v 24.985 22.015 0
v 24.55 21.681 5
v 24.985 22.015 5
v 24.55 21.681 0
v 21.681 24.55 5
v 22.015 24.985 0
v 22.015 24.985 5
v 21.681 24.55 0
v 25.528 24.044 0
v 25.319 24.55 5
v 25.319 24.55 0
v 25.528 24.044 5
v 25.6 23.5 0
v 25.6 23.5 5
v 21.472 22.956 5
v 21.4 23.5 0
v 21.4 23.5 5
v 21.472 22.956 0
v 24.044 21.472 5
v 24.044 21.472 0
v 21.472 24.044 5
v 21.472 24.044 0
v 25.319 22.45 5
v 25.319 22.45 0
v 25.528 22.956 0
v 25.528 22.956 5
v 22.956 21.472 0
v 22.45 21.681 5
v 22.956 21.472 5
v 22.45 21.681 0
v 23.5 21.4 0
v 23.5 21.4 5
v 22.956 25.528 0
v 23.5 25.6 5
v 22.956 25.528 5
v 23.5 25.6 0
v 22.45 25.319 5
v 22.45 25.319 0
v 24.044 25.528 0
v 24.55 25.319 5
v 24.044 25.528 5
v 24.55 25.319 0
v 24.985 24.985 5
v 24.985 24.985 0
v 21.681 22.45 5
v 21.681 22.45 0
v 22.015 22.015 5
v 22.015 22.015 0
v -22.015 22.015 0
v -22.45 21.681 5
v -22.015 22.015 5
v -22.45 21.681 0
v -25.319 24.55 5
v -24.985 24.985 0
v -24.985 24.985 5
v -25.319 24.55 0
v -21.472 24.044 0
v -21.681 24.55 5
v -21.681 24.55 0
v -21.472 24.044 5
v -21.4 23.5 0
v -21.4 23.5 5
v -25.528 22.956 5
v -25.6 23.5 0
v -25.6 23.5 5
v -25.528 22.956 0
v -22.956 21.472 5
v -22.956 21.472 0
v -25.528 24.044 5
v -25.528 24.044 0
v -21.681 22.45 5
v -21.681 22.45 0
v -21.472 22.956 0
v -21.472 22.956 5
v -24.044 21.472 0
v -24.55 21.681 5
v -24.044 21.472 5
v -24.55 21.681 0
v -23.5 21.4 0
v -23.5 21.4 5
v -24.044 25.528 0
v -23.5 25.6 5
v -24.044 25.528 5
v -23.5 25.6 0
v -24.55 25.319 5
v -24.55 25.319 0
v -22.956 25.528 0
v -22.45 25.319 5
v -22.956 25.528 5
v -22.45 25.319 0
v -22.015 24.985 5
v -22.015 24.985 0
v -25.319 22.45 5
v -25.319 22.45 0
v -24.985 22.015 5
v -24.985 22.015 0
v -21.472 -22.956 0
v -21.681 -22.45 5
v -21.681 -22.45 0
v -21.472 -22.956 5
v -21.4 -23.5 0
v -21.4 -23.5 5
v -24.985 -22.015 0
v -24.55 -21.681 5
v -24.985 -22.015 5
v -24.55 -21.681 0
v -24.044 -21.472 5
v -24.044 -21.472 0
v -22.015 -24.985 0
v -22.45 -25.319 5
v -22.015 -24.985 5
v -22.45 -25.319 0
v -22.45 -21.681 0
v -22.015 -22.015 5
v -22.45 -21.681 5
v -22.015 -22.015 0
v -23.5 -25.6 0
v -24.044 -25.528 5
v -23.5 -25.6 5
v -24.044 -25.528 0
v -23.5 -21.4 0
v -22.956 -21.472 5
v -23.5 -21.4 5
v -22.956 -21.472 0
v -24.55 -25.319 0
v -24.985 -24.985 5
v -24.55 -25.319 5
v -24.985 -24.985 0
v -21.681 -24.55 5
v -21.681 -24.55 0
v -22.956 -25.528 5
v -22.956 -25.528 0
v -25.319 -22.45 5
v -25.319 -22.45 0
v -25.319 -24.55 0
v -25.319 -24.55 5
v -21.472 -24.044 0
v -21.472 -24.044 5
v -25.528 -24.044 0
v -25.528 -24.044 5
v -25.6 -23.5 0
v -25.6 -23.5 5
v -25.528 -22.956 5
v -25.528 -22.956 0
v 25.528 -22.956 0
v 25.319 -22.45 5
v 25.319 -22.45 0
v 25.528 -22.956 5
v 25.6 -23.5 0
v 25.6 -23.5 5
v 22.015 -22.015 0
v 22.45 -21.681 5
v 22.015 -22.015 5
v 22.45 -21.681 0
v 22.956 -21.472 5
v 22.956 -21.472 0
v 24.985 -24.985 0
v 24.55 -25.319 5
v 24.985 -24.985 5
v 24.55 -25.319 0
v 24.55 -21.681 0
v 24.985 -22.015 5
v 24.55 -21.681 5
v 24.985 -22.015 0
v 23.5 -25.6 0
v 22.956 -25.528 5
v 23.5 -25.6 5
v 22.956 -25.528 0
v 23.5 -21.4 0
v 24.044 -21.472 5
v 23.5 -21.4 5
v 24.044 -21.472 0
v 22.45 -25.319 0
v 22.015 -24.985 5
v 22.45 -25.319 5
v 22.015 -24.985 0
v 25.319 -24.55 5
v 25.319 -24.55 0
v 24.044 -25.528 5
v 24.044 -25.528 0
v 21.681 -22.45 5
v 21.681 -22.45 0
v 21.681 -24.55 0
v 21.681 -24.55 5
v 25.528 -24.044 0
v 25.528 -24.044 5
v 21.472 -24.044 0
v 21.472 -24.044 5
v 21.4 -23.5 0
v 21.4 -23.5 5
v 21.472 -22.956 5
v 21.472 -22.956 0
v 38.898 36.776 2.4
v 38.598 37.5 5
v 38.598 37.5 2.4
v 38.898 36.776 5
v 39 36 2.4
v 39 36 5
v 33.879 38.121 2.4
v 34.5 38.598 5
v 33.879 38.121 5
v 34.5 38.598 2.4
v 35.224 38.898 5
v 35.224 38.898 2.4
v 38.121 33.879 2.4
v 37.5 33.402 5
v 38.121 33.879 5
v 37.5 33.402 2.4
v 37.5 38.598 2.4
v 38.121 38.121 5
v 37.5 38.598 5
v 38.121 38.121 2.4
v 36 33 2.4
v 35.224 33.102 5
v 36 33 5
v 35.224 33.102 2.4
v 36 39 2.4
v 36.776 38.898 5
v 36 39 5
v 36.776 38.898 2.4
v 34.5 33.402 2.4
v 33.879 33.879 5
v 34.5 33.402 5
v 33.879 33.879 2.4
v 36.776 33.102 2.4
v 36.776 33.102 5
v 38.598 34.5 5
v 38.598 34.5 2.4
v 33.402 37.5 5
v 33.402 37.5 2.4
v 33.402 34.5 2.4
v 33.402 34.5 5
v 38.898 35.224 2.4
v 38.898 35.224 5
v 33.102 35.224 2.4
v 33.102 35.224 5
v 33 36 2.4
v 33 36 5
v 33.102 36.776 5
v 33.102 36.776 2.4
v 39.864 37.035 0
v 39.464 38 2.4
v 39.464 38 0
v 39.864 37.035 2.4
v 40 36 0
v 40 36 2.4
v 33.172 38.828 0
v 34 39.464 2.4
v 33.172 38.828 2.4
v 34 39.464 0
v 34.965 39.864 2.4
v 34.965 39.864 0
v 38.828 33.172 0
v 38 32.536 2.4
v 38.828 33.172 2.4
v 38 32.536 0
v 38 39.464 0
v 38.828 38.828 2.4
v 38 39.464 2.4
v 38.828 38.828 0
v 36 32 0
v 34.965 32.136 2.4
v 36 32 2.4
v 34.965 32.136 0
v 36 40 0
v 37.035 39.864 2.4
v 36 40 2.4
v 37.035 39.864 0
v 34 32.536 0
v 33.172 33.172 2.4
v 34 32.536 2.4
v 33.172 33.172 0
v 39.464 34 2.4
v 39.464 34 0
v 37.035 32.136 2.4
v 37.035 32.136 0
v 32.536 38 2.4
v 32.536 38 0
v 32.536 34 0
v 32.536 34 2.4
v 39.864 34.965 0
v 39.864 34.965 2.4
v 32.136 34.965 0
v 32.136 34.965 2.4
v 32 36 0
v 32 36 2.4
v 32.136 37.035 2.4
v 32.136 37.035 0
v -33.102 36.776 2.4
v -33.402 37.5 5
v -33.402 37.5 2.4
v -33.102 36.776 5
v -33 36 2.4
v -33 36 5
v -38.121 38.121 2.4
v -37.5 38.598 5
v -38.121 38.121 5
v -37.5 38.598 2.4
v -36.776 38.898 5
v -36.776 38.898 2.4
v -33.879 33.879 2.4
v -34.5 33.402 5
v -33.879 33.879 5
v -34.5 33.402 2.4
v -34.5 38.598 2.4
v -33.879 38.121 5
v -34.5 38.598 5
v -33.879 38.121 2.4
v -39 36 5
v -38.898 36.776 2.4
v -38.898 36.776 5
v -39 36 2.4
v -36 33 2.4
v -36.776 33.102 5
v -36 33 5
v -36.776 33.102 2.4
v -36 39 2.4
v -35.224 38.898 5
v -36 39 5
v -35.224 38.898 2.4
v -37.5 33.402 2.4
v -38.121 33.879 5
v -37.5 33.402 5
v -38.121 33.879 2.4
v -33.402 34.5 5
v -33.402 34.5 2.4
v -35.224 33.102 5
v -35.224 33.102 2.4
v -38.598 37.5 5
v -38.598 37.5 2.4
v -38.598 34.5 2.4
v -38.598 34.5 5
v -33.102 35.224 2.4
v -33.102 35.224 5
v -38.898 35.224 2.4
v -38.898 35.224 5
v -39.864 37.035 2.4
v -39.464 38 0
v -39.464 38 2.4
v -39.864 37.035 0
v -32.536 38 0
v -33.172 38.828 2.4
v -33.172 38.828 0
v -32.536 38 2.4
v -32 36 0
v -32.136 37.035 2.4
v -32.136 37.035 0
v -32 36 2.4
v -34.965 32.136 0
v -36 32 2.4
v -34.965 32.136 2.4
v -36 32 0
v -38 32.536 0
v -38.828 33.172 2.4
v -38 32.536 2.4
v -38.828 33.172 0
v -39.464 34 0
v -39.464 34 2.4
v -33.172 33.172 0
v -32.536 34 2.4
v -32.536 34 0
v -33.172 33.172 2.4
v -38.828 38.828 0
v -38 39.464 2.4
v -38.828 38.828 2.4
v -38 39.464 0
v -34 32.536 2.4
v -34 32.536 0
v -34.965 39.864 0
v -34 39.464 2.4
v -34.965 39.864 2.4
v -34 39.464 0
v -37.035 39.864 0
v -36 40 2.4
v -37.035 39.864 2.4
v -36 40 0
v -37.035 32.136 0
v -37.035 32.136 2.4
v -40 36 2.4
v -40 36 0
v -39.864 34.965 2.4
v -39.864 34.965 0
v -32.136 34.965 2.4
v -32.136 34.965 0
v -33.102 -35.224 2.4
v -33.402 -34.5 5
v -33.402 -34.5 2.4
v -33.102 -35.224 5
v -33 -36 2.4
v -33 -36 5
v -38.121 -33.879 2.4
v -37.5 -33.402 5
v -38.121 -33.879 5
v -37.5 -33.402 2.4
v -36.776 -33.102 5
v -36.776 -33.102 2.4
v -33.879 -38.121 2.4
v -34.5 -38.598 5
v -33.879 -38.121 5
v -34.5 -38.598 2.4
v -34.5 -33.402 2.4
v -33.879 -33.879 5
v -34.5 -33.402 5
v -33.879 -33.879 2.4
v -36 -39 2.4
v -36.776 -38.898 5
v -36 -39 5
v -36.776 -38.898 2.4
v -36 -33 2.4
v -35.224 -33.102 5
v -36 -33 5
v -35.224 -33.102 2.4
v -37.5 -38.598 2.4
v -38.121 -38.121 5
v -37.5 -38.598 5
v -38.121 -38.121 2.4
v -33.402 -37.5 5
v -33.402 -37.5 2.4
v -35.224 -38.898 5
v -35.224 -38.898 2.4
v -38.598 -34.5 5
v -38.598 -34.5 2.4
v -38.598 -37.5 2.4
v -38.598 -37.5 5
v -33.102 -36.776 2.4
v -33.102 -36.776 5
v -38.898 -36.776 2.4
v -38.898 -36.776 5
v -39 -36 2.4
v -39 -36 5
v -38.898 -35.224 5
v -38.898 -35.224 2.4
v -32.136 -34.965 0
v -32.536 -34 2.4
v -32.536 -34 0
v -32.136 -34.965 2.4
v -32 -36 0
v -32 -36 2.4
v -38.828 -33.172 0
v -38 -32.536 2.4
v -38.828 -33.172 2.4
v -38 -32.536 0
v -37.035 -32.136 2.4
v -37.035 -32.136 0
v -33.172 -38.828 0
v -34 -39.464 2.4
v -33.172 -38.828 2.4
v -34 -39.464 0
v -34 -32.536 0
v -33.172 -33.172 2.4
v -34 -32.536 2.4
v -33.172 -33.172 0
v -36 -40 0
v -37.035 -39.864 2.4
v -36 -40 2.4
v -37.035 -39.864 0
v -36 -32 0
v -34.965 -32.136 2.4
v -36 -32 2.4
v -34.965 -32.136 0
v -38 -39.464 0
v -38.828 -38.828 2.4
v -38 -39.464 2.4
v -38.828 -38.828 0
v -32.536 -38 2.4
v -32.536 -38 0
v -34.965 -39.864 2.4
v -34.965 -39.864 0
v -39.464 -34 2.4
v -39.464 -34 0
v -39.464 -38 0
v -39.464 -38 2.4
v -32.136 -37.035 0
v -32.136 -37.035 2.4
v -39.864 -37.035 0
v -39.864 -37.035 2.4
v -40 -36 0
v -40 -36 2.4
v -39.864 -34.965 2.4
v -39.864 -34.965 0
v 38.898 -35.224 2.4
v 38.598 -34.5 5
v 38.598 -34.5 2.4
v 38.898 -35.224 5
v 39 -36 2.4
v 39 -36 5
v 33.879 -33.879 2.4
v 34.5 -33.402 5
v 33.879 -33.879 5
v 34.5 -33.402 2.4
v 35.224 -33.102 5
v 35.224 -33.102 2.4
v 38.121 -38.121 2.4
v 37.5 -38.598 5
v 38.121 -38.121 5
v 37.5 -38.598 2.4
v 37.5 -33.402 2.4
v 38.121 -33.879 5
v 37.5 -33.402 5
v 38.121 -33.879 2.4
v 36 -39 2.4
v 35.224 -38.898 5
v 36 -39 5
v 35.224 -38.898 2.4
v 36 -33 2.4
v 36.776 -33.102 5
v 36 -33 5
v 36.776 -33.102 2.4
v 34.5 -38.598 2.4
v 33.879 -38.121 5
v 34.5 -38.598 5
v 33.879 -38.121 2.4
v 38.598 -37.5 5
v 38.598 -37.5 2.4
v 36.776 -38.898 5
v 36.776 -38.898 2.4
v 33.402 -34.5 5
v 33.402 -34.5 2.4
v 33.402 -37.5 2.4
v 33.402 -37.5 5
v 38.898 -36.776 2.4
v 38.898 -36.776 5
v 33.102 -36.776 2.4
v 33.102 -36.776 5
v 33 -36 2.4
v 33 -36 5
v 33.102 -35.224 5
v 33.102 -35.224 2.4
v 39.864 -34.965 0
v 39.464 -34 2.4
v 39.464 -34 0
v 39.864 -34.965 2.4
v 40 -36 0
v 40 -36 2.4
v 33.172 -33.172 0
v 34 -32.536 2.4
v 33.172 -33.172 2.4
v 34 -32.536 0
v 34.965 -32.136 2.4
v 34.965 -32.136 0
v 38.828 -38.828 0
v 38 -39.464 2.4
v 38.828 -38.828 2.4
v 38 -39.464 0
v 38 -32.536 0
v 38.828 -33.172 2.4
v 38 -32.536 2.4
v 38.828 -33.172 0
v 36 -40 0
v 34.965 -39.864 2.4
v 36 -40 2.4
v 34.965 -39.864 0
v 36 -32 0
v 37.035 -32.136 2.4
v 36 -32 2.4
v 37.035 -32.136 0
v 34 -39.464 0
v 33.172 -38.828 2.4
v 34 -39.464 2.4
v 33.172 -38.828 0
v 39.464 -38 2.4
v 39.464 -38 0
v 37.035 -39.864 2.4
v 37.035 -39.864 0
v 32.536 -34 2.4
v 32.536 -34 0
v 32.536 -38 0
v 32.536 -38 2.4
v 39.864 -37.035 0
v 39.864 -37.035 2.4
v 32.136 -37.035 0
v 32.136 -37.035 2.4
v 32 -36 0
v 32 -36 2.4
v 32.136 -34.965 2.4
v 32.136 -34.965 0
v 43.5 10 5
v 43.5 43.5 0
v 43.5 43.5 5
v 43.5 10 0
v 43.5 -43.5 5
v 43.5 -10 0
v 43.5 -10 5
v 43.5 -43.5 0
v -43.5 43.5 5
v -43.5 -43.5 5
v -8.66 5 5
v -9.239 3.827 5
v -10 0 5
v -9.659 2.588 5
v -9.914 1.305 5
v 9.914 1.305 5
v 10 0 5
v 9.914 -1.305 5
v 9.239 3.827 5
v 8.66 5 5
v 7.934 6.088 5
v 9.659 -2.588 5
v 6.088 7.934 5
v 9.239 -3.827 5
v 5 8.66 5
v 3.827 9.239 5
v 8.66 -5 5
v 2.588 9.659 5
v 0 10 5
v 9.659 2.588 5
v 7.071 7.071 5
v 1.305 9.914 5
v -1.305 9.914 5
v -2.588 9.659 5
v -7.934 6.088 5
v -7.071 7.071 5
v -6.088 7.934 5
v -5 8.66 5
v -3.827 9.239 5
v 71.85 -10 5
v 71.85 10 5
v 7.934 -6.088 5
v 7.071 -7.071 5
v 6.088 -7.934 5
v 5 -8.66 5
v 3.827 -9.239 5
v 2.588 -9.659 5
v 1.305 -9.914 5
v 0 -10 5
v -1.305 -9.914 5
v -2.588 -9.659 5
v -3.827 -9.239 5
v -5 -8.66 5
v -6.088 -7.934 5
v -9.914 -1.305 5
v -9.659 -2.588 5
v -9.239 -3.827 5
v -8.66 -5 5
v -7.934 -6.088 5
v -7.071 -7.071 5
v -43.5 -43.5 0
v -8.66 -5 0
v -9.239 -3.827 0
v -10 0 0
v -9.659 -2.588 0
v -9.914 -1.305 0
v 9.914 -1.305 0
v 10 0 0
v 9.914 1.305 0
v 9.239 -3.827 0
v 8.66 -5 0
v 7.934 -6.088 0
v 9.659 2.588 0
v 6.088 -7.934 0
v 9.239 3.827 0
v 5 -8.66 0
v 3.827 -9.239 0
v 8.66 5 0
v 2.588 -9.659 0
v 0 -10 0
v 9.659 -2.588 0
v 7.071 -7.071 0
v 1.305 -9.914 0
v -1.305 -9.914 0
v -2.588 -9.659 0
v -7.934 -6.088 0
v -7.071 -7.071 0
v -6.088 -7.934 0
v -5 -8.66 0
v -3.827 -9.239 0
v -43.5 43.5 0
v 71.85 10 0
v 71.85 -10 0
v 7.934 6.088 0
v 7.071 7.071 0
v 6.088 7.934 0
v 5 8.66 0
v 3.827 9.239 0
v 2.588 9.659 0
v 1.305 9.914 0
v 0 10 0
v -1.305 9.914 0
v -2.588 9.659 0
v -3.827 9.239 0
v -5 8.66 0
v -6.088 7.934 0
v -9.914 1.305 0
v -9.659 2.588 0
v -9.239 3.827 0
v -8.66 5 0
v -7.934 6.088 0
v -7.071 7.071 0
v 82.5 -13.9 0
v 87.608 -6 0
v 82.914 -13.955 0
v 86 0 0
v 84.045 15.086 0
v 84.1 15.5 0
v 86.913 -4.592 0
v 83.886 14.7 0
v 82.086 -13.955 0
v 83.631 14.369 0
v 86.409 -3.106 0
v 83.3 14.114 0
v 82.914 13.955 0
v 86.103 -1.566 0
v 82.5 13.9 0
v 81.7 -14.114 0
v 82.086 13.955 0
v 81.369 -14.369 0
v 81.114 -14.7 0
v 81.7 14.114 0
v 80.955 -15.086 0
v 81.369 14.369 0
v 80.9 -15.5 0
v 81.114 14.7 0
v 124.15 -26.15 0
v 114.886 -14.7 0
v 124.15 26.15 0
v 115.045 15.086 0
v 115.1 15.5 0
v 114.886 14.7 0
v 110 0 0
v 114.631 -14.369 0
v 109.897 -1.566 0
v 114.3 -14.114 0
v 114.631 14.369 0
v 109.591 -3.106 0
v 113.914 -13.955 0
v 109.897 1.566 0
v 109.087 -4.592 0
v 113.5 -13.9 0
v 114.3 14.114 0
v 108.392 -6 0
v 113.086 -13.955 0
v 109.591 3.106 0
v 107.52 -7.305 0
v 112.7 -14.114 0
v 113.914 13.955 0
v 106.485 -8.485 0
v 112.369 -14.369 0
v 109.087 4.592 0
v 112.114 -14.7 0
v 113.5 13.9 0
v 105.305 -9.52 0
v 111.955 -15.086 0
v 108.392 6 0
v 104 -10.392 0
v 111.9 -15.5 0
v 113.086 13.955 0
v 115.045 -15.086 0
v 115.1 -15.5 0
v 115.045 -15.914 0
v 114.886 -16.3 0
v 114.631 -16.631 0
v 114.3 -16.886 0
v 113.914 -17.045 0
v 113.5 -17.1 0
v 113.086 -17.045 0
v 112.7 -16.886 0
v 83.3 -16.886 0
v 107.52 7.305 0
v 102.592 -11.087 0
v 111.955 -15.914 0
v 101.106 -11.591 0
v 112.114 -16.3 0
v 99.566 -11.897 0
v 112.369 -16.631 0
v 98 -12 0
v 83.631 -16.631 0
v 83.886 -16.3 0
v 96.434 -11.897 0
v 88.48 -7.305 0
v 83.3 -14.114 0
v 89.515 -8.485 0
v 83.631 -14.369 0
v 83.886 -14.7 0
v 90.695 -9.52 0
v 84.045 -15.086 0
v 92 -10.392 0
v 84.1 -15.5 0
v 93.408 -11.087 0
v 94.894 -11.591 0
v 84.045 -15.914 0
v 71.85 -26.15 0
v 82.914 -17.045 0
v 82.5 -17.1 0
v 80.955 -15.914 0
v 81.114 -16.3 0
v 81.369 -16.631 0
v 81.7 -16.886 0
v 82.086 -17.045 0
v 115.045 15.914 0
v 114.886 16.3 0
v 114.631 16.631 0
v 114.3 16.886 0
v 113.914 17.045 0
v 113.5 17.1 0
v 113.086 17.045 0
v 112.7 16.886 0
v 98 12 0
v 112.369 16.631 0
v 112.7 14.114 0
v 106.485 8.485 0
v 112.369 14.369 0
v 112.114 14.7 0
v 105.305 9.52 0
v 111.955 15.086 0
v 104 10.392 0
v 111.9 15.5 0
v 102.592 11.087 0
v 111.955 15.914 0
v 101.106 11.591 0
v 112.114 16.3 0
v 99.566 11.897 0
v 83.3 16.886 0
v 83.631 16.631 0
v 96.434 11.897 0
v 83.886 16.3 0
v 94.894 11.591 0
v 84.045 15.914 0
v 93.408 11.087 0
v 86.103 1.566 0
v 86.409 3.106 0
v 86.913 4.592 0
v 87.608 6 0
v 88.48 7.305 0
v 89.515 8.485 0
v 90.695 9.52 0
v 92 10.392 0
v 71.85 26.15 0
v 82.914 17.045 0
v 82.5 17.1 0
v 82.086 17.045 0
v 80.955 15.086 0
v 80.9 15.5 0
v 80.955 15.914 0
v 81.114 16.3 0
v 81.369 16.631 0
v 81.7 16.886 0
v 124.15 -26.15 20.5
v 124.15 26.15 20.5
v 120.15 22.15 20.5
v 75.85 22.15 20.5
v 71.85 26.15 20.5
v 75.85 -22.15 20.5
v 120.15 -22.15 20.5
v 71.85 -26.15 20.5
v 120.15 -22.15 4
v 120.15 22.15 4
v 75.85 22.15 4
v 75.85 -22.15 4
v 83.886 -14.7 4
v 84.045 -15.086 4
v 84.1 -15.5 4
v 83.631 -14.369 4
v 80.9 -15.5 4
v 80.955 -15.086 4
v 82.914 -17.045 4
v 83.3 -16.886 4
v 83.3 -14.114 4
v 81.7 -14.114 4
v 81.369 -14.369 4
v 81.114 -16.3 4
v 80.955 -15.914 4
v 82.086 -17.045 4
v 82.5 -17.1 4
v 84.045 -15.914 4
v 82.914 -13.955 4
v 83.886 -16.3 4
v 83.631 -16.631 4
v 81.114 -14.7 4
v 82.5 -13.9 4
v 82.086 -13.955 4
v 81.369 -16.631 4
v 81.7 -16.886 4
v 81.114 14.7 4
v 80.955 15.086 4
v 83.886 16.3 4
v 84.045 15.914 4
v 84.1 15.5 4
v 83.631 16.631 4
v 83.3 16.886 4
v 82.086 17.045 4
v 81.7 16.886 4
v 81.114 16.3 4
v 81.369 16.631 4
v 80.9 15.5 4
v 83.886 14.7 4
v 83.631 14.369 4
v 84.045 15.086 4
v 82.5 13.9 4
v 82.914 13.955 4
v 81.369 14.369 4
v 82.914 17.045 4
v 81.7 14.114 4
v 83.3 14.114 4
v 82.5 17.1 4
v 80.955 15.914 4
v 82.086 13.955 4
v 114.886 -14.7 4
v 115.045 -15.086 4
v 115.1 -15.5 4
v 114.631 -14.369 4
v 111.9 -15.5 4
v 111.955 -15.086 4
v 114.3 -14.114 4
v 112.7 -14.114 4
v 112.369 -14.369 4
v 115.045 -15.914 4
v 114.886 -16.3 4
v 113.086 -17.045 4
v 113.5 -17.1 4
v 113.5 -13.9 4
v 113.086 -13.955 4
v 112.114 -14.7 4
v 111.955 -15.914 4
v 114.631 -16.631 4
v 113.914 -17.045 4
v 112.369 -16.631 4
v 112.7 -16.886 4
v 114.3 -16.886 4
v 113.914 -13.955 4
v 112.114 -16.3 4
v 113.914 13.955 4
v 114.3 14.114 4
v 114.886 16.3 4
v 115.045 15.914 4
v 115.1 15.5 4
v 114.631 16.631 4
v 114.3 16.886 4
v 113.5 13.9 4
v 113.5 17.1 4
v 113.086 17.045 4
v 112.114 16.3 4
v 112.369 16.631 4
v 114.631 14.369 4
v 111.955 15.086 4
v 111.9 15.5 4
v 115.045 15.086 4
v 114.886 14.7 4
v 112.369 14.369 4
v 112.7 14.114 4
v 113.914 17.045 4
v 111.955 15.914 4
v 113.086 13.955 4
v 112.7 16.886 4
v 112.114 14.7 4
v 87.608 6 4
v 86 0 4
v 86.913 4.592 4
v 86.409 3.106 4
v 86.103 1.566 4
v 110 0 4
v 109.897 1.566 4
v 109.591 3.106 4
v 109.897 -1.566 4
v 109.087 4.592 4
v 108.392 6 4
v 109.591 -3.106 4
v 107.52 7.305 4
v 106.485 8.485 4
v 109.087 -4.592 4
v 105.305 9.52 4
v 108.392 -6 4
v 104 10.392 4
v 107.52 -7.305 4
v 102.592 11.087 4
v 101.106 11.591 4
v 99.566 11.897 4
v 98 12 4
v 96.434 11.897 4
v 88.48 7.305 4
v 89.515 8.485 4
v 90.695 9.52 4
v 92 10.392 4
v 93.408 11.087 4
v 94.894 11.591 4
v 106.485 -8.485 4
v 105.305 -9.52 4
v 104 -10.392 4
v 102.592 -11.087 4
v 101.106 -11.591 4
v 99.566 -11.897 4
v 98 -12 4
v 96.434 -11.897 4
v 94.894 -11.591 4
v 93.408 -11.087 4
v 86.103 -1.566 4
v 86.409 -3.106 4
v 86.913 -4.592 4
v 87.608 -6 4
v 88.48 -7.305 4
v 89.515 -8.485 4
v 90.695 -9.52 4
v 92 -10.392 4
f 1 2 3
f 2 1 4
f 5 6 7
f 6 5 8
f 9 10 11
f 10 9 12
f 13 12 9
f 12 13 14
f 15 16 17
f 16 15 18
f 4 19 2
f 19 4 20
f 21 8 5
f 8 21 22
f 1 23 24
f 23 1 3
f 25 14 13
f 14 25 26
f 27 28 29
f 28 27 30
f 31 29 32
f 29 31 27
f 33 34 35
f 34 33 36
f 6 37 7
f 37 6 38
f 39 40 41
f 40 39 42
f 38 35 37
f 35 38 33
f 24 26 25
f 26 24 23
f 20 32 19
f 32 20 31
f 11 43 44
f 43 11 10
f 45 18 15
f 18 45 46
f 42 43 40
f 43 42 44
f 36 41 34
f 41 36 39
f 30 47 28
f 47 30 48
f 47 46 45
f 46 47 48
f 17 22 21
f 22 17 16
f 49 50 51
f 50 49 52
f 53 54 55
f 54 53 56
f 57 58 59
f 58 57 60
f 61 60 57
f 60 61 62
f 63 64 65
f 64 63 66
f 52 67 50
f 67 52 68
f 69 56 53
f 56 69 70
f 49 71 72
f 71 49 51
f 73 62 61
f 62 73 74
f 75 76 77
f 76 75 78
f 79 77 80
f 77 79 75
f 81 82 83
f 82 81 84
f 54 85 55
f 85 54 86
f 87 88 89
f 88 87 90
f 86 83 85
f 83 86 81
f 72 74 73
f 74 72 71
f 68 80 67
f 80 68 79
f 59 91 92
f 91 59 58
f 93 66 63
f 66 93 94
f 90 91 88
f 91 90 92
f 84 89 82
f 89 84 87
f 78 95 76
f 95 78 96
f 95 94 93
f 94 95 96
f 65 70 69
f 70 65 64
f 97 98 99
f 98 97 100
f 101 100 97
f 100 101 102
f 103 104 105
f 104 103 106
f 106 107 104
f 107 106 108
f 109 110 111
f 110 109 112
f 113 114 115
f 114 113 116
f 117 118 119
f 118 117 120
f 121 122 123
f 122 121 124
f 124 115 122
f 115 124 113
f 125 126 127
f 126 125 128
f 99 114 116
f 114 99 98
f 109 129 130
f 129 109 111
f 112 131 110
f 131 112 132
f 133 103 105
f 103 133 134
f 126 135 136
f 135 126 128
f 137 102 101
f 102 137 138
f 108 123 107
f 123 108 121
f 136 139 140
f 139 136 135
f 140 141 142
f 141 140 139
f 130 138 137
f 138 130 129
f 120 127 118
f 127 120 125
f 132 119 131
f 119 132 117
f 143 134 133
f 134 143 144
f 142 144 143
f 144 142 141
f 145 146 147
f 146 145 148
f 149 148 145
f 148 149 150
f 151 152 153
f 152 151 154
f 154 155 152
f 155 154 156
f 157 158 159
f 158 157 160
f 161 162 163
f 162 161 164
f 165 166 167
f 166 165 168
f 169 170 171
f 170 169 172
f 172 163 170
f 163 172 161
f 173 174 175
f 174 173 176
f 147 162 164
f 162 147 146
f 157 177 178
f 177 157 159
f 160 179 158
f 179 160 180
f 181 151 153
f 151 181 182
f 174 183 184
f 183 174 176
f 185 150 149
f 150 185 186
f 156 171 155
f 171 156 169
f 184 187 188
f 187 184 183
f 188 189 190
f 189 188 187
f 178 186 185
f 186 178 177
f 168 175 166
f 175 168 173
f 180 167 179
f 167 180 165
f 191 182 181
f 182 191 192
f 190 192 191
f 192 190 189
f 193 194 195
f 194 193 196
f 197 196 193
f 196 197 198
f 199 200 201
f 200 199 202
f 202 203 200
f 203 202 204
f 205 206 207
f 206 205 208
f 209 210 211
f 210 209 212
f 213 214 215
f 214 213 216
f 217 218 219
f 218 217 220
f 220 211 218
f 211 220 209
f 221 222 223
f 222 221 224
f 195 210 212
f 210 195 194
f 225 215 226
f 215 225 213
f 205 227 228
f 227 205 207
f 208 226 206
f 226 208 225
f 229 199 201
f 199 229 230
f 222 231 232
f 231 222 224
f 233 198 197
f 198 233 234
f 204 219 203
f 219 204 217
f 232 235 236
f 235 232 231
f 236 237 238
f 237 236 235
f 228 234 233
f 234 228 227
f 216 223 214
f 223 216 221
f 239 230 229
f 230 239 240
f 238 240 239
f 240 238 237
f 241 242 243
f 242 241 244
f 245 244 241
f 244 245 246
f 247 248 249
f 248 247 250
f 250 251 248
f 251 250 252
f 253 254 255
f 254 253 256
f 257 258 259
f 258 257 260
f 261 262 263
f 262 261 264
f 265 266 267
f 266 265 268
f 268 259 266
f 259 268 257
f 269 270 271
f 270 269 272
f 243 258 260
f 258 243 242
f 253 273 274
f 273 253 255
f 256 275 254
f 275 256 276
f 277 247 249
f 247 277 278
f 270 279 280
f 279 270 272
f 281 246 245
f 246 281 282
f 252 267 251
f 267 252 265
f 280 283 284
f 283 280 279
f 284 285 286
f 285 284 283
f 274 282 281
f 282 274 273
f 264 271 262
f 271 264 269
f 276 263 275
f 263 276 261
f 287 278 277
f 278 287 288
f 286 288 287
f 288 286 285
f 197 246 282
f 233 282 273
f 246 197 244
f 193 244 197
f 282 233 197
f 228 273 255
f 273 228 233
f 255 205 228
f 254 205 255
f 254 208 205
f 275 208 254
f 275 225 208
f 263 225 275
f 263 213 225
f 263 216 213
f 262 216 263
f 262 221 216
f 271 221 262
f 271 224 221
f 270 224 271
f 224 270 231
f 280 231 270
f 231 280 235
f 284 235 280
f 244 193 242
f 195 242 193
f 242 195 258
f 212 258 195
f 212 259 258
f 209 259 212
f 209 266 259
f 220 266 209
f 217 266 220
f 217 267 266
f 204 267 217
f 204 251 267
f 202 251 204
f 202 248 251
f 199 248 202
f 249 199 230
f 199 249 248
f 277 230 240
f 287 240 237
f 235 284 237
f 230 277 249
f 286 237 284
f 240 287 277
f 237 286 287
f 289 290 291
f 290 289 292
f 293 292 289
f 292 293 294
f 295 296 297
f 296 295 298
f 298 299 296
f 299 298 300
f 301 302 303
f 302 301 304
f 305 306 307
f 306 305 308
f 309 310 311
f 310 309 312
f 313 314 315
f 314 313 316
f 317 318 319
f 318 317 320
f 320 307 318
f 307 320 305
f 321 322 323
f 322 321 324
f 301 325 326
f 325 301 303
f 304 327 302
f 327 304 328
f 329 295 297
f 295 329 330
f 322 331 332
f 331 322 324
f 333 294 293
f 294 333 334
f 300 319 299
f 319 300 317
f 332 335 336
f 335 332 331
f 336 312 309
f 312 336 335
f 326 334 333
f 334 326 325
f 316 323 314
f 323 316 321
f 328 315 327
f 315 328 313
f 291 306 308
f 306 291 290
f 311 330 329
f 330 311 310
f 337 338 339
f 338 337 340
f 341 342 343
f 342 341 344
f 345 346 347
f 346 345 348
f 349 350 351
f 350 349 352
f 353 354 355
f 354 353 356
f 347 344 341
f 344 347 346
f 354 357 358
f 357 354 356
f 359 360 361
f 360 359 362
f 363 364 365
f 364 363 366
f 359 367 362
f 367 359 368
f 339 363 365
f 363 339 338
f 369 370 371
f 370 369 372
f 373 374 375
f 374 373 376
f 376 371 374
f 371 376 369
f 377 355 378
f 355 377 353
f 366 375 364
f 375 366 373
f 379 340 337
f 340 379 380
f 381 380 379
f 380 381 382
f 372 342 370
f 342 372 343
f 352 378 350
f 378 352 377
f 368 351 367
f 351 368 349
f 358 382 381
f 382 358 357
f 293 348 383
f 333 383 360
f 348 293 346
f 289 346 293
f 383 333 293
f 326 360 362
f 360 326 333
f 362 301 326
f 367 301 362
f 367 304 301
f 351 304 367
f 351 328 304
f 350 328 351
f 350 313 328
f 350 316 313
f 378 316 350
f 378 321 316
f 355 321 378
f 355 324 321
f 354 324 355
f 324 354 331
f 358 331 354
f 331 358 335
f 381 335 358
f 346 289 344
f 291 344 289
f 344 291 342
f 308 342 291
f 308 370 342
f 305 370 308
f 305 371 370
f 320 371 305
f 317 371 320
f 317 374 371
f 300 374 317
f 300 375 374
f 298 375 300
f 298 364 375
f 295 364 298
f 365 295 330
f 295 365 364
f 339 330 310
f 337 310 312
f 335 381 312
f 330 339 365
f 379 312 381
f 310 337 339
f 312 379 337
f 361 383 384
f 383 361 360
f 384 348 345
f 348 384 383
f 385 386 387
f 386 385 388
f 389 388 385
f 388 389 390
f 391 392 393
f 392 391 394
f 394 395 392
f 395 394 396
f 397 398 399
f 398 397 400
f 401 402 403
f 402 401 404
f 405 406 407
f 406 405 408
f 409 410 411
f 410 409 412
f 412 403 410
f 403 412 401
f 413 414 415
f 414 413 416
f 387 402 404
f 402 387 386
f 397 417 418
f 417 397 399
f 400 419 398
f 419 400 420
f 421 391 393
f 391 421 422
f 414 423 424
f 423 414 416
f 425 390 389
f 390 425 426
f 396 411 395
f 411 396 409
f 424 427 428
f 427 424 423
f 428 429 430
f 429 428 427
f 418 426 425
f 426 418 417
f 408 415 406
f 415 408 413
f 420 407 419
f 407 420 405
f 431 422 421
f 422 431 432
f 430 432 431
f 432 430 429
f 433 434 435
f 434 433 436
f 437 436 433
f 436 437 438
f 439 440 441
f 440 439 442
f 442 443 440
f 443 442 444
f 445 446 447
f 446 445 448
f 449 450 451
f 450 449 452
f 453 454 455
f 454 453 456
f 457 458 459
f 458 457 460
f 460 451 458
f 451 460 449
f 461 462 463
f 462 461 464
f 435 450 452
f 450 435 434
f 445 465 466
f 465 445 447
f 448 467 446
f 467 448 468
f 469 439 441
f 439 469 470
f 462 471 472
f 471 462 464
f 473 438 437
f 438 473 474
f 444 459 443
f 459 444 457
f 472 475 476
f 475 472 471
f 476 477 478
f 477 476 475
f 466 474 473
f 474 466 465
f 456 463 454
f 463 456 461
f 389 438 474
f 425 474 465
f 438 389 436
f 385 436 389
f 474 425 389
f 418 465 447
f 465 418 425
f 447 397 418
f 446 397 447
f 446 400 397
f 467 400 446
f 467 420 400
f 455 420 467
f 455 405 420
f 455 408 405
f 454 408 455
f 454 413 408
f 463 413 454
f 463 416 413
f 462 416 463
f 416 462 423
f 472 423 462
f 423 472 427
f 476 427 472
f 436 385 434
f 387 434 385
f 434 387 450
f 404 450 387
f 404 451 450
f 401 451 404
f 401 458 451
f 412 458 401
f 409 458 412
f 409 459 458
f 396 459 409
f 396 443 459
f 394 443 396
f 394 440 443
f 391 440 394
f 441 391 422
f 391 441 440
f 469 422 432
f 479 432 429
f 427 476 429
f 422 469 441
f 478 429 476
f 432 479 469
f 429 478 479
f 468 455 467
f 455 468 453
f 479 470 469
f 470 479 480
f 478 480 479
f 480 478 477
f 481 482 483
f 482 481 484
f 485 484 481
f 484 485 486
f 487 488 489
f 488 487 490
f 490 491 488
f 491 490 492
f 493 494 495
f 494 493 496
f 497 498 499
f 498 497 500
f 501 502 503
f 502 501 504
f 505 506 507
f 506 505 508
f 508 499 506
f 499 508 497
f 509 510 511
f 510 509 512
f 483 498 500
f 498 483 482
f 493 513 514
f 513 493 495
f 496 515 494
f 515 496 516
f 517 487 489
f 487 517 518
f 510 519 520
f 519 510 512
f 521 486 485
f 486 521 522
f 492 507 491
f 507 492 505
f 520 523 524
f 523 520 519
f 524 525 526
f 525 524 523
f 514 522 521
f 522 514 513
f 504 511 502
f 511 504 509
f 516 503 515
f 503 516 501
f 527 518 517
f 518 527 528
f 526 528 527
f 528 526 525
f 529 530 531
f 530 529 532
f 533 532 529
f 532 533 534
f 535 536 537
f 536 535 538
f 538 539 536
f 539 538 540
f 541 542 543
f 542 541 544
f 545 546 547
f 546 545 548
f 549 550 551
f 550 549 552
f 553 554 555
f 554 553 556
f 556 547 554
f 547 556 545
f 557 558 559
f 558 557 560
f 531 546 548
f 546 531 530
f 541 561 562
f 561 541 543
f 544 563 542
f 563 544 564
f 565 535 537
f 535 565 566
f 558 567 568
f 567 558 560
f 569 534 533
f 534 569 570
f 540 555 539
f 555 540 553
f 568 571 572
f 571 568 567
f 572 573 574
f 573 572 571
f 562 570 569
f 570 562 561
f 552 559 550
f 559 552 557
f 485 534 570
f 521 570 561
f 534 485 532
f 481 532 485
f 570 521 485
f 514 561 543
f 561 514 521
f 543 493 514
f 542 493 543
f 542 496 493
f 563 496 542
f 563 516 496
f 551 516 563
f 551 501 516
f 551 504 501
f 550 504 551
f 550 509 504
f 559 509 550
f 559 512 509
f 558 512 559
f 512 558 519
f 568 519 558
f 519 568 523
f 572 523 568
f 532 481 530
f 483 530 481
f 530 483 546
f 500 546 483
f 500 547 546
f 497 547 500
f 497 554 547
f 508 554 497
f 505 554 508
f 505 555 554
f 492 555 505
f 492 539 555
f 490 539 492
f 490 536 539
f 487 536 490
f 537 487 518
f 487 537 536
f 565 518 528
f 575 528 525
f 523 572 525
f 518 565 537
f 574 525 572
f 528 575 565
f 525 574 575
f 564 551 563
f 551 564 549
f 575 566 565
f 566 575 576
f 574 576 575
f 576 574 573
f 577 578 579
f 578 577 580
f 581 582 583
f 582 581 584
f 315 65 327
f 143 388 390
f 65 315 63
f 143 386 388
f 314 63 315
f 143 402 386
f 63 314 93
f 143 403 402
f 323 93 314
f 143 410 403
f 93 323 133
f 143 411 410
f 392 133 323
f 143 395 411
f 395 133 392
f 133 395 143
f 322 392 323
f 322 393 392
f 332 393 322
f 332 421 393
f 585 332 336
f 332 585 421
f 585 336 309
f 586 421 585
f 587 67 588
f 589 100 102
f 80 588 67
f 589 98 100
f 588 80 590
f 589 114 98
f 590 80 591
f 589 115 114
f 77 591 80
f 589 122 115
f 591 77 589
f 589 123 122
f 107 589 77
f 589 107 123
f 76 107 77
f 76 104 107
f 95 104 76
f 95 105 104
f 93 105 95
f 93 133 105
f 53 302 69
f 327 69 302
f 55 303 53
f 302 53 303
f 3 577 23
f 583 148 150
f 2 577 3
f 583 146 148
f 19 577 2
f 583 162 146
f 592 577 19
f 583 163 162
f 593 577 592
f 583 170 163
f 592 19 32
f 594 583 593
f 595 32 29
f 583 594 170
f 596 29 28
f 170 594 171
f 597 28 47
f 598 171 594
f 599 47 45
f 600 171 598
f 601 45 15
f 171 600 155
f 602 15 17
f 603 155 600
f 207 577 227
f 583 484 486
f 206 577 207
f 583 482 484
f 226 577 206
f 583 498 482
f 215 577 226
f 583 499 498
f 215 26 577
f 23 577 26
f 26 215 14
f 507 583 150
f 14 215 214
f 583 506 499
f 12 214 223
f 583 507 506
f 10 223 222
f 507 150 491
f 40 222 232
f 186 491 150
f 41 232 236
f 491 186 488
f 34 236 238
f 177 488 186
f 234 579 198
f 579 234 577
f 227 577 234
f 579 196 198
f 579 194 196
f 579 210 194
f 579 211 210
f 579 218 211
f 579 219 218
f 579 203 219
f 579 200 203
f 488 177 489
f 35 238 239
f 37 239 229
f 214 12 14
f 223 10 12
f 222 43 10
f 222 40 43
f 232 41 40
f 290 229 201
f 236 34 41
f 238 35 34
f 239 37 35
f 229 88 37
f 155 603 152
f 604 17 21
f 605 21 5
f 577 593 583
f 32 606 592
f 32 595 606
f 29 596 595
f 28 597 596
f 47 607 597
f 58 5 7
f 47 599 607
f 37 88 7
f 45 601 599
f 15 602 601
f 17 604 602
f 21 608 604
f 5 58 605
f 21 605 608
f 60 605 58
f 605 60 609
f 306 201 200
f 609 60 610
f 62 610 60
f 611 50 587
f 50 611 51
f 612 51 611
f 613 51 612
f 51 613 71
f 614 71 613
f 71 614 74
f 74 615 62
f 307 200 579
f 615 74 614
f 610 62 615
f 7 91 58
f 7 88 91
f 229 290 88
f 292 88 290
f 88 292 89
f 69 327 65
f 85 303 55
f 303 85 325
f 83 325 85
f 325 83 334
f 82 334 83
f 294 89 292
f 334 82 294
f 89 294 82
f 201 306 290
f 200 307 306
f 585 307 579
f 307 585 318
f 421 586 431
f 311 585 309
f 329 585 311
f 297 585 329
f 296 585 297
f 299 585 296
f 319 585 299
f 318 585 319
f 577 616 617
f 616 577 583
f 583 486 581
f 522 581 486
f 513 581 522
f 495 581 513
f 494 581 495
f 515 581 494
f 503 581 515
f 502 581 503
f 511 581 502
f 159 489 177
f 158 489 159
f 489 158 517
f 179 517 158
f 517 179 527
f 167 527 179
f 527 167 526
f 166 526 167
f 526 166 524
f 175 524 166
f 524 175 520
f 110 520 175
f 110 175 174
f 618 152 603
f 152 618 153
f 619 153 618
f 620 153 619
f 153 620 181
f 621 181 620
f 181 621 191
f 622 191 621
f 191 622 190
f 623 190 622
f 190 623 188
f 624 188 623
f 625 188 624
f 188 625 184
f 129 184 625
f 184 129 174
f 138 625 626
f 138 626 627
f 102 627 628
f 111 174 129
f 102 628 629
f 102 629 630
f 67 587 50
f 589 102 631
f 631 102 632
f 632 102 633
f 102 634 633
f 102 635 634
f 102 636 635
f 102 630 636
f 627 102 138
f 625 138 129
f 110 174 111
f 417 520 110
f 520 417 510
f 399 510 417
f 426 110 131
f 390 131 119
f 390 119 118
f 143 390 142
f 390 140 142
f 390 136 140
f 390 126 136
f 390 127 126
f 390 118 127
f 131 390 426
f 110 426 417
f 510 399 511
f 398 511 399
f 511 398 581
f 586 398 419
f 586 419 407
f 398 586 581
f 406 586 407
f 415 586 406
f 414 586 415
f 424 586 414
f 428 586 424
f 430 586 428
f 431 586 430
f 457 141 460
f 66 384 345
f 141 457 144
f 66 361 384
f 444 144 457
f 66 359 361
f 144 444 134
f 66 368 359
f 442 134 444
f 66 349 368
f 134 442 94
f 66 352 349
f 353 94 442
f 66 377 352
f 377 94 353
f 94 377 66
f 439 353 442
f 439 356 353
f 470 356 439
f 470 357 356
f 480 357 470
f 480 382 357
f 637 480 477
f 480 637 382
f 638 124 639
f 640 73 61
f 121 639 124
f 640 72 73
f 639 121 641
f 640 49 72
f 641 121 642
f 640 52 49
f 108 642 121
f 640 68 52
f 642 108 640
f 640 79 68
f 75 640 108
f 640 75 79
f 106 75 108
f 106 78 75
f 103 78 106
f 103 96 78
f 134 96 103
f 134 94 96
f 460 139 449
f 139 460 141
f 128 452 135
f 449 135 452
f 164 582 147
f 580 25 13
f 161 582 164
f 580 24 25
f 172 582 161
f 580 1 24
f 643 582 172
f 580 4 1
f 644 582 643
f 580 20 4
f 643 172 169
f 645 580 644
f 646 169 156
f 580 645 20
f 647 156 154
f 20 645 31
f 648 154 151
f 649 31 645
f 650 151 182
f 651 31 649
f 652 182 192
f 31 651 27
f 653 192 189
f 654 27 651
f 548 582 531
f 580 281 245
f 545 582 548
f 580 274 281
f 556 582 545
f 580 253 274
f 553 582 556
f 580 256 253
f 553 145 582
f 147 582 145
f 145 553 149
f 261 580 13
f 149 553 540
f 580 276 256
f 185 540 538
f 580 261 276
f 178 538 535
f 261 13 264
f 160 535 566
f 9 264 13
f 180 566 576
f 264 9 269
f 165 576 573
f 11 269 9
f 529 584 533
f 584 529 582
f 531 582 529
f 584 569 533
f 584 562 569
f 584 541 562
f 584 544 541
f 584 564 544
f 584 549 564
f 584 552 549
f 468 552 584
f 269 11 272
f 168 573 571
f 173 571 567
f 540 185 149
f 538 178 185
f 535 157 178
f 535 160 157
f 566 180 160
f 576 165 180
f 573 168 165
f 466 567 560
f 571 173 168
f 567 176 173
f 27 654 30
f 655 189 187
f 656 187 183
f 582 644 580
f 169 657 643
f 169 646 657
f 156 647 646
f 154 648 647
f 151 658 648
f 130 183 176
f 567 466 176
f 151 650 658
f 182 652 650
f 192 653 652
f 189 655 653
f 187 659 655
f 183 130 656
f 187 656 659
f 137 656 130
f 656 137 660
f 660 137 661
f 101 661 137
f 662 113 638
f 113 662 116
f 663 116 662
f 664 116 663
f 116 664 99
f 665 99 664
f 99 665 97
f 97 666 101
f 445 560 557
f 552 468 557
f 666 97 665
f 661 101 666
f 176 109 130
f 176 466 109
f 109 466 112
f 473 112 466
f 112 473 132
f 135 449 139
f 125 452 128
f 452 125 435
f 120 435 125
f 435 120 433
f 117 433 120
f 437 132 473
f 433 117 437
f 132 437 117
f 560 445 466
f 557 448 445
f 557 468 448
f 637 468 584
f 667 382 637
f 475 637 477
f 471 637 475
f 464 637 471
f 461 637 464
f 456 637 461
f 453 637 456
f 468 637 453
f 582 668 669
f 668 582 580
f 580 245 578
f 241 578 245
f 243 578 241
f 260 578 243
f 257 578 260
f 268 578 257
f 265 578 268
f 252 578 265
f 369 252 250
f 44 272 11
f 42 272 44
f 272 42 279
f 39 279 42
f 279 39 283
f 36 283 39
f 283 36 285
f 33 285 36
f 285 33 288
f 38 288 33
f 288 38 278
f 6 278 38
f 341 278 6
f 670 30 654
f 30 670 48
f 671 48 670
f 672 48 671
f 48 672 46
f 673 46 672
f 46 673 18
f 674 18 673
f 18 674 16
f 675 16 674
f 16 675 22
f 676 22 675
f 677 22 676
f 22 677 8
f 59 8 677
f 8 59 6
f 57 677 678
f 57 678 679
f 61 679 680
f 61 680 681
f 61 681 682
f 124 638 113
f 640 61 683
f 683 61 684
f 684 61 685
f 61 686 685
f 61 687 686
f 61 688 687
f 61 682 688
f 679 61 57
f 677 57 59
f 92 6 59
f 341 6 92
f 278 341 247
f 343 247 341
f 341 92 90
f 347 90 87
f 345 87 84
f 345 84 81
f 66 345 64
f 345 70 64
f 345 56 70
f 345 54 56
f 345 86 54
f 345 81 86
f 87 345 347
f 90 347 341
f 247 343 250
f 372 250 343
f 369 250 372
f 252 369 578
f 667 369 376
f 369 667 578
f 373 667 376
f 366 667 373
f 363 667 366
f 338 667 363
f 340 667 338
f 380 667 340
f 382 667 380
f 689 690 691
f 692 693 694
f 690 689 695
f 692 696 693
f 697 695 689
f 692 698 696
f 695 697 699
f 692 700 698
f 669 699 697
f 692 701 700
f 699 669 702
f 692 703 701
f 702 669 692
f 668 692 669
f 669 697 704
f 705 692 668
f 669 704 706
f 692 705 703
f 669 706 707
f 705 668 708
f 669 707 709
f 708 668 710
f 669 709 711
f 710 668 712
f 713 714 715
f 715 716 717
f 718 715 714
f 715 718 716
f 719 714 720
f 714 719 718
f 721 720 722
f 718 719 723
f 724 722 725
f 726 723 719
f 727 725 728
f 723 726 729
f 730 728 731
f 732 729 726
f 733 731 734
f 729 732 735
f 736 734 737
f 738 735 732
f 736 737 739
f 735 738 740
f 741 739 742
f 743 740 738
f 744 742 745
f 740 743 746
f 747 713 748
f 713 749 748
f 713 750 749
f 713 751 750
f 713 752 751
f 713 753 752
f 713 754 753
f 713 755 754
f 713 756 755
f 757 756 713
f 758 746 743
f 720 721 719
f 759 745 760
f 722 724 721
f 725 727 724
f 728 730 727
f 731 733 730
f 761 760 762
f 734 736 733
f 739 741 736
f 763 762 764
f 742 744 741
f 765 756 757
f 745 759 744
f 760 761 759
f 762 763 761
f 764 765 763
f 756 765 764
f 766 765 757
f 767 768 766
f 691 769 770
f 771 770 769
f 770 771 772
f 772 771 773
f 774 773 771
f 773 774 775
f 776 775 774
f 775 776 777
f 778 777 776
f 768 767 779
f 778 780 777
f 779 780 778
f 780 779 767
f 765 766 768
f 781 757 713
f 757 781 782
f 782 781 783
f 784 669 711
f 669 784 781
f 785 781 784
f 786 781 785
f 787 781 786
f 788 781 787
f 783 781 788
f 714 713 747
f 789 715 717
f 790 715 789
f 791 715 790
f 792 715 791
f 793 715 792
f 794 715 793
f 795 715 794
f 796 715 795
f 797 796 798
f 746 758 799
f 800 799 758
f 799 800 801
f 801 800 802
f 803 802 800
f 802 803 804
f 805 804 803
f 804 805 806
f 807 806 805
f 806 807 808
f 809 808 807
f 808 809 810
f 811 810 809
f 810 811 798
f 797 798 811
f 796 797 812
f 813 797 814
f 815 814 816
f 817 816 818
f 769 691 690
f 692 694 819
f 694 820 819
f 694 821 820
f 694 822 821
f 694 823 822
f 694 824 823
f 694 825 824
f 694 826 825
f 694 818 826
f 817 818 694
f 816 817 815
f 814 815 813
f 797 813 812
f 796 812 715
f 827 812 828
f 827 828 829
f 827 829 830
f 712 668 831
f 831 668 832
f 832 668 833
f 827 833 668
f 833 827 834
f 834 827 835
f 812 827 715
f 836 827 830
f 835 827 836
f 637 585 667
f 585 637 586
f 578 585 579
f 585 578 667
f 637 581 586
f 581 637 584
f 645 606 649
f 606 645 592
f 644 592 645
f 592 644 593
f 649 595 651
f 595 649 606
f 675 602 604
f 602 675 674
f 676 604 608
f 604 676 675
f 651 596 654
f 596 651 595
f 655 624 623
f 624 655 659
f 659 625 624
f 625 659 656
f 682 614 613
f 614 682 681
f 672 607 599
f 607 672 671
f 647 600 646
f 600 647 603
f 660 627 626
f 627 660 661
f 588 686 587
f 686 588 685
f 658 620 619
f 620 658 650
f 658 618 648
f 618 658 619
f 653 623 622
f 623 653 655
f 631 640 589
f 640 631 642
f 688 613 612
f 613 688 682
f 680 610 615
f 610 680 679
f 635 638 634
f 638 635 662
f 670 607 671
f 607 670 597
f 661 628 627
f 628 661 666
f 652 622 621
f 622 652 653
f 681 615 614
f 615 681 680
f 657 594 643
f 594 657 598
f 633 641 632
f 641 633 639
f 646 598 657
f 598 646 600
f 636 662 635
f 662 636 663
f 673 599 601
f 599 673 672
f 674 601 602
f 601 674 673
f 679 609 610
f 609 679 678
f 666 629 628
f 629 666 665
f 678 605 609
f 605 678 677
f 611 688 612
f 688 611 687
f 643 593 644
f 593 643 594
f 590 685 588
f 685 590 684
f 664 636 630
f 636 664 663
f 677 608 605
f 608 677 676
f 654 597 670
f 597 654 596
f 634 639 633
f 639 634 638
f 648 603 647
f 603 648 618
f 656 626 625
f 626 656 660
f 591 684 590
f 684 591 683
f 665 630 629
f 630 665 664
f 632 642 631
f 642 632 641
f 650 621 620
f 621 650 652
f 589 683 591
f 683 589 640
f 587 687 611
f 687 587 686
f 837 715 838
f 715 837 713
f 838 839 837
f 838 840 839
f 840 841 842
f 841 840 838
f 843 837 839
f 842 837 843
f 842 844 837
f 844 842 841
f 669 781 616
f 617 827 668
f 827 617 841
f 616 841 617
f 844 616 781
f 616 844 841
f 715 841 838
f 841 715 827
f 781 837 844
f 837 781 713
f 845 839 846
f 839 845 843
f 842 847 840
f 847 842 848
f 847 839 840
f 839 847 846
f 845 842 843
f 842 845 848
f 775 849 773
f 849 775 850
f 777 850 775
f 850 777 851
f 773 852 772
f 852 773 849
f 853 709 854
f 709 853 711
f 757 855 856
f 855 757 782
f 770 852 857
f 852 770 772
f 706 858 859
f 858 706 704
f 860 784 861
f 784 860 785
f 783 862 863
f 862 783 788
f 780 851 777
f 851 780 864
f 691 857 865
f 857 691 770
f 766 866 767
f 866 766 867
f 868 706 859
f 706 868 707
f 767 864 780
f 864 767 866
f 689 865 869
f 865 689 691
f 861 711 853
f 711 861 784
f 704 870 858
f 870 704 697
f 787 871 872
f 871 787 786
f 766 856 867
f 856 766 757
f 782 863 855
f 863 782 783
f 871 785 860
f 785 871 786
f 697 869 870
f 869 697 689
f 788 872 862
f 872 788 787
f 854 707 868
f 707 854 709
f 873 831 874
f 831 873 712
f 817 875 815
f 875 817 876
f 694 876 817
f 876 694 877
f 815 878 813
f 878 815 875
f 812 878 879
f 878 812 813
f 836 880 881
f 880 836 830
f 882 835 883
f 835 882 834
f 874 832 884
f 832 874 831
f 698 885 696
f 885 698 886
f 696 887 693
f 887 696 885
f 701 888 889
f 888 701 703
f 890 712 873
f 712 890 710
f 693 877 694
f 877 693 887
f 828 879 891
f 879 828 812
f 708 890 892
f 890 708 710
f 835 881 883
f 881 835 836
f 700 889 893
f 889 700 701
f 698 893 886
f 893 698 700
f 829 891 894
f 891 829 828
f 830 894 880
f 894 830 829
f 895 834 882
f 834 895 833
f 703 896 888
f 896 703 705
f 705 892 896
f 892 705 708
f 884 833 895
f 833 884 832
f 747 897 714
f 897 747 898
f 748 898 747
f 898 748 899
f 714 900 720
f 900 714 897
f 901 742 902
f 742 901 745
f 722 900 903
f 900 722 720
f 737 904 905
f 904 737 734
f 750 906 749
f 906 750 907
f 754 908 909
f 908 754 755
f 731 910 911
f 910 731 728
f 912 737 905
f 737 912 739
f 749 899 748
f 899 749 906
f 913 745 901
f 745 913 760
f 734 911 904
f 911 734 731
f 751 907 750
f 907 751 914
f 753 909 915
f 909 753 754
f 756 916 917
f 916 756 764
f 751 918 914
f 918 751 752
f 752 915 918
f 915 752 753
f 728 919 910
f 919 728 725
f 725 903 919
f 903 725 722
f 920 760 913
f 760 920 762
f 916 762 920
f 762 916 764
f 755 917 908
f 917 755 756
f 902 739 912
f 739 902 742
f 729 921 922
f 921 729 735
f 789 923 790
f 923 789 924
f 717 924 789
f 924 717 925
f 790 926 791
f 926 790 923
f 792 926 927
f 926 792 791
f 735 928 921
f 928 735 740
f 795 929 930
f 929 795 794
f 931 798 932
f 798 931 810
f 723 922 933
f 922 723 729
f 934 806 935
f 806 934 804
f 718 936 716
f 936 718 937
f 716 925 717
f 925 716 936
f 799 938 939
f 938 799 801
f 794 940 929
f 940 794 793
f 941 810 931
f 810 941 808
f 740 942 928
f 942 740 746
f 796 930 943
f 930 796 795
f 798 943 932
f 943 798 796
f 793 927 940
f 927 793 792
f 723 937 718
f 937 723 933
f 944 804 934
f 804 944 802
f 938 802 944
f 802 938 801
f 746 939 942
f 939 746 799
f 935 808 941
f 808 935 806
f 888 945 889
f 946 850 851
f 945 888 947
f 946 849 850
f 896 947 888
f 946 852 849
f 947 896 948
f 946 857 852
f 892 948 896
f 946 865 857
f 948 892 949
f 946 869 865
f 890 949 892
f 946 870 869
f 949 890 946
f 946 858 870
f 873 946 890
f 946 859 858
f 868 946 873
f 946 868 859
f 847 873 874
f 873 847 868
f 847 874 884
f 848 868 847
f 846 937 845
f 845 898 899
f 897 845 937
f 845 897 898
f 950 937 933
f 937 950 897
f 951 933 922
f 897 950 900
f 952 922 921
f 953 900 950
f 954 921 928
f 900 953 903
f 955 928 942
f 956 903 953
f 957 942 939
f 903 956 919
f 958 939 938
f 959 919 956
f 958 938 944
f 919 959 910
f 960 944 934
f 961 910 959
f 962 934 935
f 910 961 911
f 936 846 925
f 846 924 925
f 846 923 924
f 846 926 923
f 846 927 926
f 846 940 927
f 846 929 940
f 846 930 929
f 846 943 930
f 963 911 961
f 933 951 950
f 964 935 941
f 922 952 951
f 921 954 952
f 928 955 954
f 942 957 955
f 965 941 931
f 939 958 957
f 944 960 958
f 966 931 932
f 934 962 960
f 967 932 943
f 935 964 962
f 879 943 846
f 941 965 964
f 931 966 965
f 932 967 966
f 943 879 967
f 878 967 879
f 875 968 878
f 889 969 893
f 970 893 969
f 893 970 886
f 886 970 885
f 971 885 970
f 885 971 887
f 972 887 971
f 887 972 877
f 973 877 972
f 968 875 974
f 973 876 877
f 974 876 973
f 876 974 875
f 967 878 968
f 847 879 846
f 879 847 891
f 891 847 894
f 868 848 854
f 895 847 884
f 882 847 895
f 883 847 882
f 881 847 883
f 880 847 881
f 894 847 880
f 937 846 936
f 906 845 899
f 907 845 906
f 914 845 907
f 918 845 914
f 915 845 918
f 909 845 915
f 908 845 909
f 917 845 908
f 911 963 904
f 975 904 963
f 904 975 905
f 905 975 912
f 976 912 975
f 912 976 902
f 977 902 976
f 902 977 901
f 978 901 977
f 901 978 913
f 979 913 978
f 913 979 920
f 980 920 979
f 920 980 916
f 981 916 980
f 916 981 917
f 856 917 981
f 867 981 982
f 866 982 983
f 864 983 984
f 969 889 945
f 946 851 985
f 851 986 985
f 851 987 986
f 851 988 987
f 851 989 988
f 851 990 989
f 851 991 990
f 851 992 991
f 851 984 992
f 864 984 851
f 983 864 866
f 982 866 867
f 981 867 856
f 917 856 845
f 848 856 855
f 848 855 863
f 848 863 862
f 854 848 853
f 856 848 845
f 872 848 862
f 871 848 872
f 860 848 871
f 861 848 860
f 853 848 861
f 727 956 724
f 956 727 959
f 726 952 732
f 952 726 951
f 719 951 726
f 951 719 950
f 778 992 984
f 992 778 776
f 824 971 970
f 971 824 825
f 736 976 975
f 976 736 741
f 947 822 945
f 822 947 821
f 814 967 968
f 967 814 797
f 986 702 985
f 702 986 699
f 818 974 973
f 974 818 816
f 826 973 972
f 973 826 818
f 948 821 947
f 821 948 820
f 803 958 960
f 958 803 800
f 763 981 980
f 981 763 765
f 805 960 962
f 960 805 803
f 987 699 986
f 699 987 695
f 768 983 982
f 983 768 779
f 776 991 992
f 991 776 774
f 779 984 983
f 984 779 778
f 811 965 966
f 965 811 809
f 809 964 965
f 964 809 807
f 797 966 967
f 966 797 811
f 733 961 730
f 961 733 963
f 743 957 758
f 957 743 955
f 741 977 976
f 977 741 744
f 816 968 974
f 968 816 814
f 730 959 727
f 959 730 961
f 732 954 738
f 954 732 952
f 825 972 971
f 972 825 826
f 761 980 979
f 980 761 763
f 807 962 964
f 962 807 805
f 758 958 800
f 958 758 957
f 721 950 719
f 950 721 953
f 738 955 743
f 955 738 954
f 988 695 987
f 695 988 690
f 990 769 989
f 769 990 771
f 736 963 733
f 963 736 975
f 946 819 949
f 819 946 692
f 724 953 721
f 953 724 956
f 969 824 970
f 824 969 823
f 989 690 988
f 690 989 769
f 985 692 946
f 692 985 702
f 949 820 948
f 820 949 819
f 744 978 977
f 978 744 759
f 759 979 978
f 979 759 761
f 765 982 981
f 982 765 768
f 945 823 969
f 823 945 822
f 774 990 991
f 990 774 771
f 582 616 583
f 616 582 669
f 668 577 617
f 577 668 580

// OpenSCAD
// file: ../src/model_b_wall_bracket.scad
// ============================================
// PiCanvas - 모델 B: 벽면 브라켓 + 모터 마운트
// ============================================

// --- 파라미터 ---

// 턴테이블 베어링
tb_size = 57;
tb_thickness = 10.5;
tb_bolt_inset = 5;
tb_bolt_dia = 4.2;     // M4 관통홀

// 모터 17HS4023
motor_w = 42.3;
motor_h = 42.3;
motor_d = 23.5;
motor_shaft_dia = 5;
motor_mount_pitch = 31;   // NEMA17 마운트홀 피치
motor_mount_hole = 3.2;   // M3 관통홀
motor_body_dia = 22;      // 모터 전면 보스 직경

// 벨트 시스템
belt_center_distance = 98;  // 축간 거리 (300mm 벨트)

// 모터 위치: 중심에서 belt_center_distance만큼 오프셋
// 모터를 오른쪽(+X)에 배치
motor_offset_x = belt_center_distance;
motor_offset_y = 0;

// 벽면 브라켓
wall_plate_thickness = 5;
wall_plate_margin = 15;    // 턴테이블 주변 여유
wall_anchor_dia = 6;       // 벽 앵커홀 직경
wall_anchor_count_head = 8; // 카운터싱크 직경

// 모터 마운트 (측면 클램프)
motor_clamp_wall = 4;      // 클램프 벽 두께
motor_clamp_gap = 1;       // 모터와의 간극
motor_clamp_height = motor_d - 3;  // 모터 높이보다 살짝 낮게

// Z 높이 맞춤
// 풀리 벨트 면이 모델A의 80T 풀리와 같은 높이여야 함
// 모델A: bracket_thickness(5) + pulley위치
// 모델B에서 모터 샤프트 높이를 맞춤
gt2_belt_width = 6;
bracket_a_thickness = 5;
pulley_ring_offset = bracket_a_thickness + 1;  // 풀리 벨트 중심 Z

// --- 모듈 ---

// 턴테이블 볼트홀 패턴
module tb_bolt_pattern(dia, depth) {
    bolt_x = tb_size/2 - tb_bolt_inset;
    bolt_y = tb_size/2 - tb_bolt_inset;
    positions = [
        [ bolt_x,  bolt_y],
        [-bolt_x,  bolt_y],
        [-bolt_x, -bolt_y],
        [ bolt_x, -bolt_y]
    ];
    for (pos = positions) {
        translate([pos[0], pos[1], -0.1])
            cylinder(d = dia, h = depth + 0.2, $fn = 24);
    }
}

// 벽면 앵커홀
module wall_anchor_holes() {
    // 턴테이블 바깥 코너 4곳
    anchor_offset = tb_size/2 + wall_plate_margin/2;
    positions = [
        [ anchor_offset,  anchor_offset],
        [-anchor_offset,  anchor_offset],
        [-anchor_offset, -anchor_offset],
        [ anchor_offset, -anchor_offset]
    ];
    for (pos = positions) {
        translate([pos[0], pos[1], -0.1]) {
            cylinder(d = wall_anchor_dia, h = wall_plate_thickness + 0.2, $fn = 24);
            // 카운터싱크
            cylinder(d = wall_anchor_count_head, h = 2.5, $fn = 24);
        }
    }
}

// 모터 측면 클램프 (축 수직, 샤프트 위 방향)
module motor_side_clamp() {
    inner_w = motor_w + motor_clamp_gap * 2;
    inner_h = motor_h + motor_clamp_gap * 2;
    outer_w = inner_w + motor_clamp_wall * 2;
    outer_h = inner_h + motor_clamp_wall * 2;

    difference() {
        // 외부 박스
        translate([-outer_w/2, -outer_h/2, 0])
            cube([outer_w, outer_h, motor_clamp_height]);

        // 모터 삽입 공간
        translate([-inner_w/2, -inner_h/2, -0.1])
            cube([inner_w, inner_h, motor_clamp_height + 0.2]);

        // 샤프트 통과 구멍 (위쪽)
        translate([0, 0, -0.1])
            cylinder(d = motor_body_dia + 2, h = motor_clamp_height + 0.2, $fn = 48);
    }

    // NEMA17 마운트 서포트 (바닥판)
    difference() {
        translate([-outer_w/2, -outer_h/2, 0])
            cube([outer_w, outer_h, motor_clamp_wall]);

        // 샤프트 통과
        translate([0, 0, -0.1])
            cylinder(d = motor_body_dia + 2, h = motor_clamp_wall + 0.2, $fn = 48);

        // NEMA17 마운트 볼트홀
        for (x = [-motor_mount_pitch/2, motor_mount_pitch/2])
            for (y = [-motor_mount_pitch/2, motor_mount_pitch/2])
                translate([x, y, -0.1])
                    cylinder(d = motor_mount_hole, h = motor_clamp_wall + 0.2, $fn = 24);
    }
}

// 연결 브릿지 (턴테이블 플레이트 → 모터 마운트)
module bridge() {
    bridge_width = 20;
    bridge_height = wall_plate_thickness;

    // 턴테이블 중심에서 모터 중심까지
    hull() {
        translate([tb_size/2, -bridge_width/2, 0])
            cube([1, bridge_width, bridge_height]);
        translate([motor_offset_x - motor_w/2 - motor_clamp_wall - motor_clamp_gap, -bridge_width/2, 0])
            cube([1, bridge_width, bridge_height]);
    }
}

// --- 메인 ---

module model_b_wall_bracket() {
    // 턴테이블 마운트 플레이트
    color("OrangeRed") {
        plate_size = tb_size + wall_plate_margin * 2;
        difference() {
            translate([-plate_size/2, -plate_size/2, 0])
                cube([plate_size, plate_size, wall_plate_thickness]);

            // 턴테이블 볼트홀 (고정판)
            tb_bolt_pattern(tb_bolt_dia, wall_plate_thickness);

            // 벽면 앵커홀
            wall_anchor_holes();

            // 중앙 관통홀 (케이블)
            translate([0, 0, -0.1])
                cylinder(d = 20, h = wall_plate_thickness + 0.2, $fn = 48);
        }
    }

    // 모터 마운트 브릿지
    color("OrangeRed")
        bridge();

    // 모터 클램프
    color("Tomato")
        translate([motor_offset_x, motor_offset_y, 0])
            motor_side_clamp();
}

model_b_wall_bracket();

// 디버그: 턴테이블 베어링 (투명)
%translate([-tb_size/2, -tb_size/2, wall_plate_thickness])
    cube([tb_size, tb_size, tb_thickness]);

// 디버그: 모터 (투명)
%translate([motor_offset_x - motor_w/2, motor_offset_y - motor_h/2, motor_clamp_wall])
    cube([motor_w, motor_h, motor_d]);
// main file
// ============================================
// Plate 12: 모델 B - 벽면 브라켓 + 모터 마운트
// 크기: ~168 x 87 mm (OK)
// ============================================
use <../src/model_b_wall_bracket.scad>

model_b_wall_bracket();
